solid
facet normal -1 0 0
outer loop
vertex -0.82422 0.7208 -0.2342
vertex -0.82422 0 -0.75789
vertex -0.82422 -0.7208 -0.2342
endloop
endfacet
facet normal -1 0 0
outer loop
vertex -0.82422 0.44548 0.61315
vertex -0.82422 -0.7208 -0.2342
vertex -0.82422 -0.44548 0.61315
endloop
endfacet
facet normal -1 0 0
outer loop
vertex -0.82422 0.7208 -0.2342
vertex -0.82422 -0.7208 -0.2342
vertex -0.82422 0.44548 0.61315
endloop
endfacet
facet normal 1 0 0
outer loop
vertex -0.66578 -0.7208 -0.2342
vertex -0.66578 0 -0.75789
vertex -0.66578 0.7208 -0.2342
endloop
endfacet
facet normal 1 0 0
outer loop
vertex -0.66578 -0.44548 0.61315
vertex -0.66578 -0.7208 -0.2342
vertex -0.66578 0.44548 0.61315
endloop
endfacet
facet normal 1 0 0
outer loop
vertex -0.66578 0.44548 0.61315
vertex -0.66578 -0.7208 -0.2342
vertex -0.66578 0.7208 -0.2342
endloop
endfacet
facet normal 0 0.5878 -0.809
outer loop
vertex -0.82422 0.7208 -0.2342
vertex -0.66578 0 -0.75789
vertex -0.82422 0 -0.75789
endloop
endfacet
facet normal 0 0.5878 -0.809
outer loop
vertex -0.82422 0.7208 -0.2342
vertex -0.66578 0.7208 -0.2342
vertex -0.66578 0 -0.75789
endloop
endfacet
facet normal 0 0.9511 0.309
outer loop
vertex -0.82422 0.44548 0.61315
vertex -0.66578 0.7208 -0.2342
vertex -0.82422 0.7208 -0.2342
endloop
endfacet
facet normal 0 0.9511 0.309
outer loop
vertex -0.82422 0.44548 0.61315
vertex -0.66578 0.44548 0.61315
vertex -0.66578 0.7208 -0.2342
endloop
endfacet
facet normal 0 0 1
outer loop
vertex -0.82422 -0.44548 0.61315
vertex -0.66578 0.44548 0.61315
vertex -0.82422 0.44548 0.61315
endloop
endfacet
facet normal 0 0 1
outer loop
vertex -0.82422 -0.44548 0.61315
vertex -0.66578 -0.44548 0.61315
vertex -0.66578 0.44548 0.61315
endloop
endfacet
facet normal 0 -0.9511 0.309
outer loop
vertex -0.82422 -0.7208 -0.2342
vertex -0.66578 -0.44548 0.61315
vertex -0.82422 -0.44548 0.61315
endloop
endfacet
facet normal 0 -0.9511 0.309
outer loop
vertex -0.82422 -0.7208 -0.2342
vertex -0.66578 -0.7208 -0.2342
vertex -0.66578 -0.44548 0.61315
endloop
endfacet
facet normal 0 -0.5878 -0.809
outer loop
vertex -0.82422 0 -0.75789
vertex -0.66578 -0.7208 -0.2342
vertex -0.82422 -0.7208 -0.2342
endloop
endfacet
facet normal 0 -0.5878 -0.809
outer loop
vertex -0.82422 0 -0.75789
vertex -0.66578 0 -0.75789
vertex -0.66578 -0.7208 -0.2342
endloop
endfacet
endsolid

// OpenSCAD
EPS = 0.01;

translate([-0.75, 0, 0])
rotate([0, 90, 0])
translate([0, 0, -0.1484375/2])
linear_extrude(height=0.1484375 + EPS)
    circle(r=0.7578947368421053);
